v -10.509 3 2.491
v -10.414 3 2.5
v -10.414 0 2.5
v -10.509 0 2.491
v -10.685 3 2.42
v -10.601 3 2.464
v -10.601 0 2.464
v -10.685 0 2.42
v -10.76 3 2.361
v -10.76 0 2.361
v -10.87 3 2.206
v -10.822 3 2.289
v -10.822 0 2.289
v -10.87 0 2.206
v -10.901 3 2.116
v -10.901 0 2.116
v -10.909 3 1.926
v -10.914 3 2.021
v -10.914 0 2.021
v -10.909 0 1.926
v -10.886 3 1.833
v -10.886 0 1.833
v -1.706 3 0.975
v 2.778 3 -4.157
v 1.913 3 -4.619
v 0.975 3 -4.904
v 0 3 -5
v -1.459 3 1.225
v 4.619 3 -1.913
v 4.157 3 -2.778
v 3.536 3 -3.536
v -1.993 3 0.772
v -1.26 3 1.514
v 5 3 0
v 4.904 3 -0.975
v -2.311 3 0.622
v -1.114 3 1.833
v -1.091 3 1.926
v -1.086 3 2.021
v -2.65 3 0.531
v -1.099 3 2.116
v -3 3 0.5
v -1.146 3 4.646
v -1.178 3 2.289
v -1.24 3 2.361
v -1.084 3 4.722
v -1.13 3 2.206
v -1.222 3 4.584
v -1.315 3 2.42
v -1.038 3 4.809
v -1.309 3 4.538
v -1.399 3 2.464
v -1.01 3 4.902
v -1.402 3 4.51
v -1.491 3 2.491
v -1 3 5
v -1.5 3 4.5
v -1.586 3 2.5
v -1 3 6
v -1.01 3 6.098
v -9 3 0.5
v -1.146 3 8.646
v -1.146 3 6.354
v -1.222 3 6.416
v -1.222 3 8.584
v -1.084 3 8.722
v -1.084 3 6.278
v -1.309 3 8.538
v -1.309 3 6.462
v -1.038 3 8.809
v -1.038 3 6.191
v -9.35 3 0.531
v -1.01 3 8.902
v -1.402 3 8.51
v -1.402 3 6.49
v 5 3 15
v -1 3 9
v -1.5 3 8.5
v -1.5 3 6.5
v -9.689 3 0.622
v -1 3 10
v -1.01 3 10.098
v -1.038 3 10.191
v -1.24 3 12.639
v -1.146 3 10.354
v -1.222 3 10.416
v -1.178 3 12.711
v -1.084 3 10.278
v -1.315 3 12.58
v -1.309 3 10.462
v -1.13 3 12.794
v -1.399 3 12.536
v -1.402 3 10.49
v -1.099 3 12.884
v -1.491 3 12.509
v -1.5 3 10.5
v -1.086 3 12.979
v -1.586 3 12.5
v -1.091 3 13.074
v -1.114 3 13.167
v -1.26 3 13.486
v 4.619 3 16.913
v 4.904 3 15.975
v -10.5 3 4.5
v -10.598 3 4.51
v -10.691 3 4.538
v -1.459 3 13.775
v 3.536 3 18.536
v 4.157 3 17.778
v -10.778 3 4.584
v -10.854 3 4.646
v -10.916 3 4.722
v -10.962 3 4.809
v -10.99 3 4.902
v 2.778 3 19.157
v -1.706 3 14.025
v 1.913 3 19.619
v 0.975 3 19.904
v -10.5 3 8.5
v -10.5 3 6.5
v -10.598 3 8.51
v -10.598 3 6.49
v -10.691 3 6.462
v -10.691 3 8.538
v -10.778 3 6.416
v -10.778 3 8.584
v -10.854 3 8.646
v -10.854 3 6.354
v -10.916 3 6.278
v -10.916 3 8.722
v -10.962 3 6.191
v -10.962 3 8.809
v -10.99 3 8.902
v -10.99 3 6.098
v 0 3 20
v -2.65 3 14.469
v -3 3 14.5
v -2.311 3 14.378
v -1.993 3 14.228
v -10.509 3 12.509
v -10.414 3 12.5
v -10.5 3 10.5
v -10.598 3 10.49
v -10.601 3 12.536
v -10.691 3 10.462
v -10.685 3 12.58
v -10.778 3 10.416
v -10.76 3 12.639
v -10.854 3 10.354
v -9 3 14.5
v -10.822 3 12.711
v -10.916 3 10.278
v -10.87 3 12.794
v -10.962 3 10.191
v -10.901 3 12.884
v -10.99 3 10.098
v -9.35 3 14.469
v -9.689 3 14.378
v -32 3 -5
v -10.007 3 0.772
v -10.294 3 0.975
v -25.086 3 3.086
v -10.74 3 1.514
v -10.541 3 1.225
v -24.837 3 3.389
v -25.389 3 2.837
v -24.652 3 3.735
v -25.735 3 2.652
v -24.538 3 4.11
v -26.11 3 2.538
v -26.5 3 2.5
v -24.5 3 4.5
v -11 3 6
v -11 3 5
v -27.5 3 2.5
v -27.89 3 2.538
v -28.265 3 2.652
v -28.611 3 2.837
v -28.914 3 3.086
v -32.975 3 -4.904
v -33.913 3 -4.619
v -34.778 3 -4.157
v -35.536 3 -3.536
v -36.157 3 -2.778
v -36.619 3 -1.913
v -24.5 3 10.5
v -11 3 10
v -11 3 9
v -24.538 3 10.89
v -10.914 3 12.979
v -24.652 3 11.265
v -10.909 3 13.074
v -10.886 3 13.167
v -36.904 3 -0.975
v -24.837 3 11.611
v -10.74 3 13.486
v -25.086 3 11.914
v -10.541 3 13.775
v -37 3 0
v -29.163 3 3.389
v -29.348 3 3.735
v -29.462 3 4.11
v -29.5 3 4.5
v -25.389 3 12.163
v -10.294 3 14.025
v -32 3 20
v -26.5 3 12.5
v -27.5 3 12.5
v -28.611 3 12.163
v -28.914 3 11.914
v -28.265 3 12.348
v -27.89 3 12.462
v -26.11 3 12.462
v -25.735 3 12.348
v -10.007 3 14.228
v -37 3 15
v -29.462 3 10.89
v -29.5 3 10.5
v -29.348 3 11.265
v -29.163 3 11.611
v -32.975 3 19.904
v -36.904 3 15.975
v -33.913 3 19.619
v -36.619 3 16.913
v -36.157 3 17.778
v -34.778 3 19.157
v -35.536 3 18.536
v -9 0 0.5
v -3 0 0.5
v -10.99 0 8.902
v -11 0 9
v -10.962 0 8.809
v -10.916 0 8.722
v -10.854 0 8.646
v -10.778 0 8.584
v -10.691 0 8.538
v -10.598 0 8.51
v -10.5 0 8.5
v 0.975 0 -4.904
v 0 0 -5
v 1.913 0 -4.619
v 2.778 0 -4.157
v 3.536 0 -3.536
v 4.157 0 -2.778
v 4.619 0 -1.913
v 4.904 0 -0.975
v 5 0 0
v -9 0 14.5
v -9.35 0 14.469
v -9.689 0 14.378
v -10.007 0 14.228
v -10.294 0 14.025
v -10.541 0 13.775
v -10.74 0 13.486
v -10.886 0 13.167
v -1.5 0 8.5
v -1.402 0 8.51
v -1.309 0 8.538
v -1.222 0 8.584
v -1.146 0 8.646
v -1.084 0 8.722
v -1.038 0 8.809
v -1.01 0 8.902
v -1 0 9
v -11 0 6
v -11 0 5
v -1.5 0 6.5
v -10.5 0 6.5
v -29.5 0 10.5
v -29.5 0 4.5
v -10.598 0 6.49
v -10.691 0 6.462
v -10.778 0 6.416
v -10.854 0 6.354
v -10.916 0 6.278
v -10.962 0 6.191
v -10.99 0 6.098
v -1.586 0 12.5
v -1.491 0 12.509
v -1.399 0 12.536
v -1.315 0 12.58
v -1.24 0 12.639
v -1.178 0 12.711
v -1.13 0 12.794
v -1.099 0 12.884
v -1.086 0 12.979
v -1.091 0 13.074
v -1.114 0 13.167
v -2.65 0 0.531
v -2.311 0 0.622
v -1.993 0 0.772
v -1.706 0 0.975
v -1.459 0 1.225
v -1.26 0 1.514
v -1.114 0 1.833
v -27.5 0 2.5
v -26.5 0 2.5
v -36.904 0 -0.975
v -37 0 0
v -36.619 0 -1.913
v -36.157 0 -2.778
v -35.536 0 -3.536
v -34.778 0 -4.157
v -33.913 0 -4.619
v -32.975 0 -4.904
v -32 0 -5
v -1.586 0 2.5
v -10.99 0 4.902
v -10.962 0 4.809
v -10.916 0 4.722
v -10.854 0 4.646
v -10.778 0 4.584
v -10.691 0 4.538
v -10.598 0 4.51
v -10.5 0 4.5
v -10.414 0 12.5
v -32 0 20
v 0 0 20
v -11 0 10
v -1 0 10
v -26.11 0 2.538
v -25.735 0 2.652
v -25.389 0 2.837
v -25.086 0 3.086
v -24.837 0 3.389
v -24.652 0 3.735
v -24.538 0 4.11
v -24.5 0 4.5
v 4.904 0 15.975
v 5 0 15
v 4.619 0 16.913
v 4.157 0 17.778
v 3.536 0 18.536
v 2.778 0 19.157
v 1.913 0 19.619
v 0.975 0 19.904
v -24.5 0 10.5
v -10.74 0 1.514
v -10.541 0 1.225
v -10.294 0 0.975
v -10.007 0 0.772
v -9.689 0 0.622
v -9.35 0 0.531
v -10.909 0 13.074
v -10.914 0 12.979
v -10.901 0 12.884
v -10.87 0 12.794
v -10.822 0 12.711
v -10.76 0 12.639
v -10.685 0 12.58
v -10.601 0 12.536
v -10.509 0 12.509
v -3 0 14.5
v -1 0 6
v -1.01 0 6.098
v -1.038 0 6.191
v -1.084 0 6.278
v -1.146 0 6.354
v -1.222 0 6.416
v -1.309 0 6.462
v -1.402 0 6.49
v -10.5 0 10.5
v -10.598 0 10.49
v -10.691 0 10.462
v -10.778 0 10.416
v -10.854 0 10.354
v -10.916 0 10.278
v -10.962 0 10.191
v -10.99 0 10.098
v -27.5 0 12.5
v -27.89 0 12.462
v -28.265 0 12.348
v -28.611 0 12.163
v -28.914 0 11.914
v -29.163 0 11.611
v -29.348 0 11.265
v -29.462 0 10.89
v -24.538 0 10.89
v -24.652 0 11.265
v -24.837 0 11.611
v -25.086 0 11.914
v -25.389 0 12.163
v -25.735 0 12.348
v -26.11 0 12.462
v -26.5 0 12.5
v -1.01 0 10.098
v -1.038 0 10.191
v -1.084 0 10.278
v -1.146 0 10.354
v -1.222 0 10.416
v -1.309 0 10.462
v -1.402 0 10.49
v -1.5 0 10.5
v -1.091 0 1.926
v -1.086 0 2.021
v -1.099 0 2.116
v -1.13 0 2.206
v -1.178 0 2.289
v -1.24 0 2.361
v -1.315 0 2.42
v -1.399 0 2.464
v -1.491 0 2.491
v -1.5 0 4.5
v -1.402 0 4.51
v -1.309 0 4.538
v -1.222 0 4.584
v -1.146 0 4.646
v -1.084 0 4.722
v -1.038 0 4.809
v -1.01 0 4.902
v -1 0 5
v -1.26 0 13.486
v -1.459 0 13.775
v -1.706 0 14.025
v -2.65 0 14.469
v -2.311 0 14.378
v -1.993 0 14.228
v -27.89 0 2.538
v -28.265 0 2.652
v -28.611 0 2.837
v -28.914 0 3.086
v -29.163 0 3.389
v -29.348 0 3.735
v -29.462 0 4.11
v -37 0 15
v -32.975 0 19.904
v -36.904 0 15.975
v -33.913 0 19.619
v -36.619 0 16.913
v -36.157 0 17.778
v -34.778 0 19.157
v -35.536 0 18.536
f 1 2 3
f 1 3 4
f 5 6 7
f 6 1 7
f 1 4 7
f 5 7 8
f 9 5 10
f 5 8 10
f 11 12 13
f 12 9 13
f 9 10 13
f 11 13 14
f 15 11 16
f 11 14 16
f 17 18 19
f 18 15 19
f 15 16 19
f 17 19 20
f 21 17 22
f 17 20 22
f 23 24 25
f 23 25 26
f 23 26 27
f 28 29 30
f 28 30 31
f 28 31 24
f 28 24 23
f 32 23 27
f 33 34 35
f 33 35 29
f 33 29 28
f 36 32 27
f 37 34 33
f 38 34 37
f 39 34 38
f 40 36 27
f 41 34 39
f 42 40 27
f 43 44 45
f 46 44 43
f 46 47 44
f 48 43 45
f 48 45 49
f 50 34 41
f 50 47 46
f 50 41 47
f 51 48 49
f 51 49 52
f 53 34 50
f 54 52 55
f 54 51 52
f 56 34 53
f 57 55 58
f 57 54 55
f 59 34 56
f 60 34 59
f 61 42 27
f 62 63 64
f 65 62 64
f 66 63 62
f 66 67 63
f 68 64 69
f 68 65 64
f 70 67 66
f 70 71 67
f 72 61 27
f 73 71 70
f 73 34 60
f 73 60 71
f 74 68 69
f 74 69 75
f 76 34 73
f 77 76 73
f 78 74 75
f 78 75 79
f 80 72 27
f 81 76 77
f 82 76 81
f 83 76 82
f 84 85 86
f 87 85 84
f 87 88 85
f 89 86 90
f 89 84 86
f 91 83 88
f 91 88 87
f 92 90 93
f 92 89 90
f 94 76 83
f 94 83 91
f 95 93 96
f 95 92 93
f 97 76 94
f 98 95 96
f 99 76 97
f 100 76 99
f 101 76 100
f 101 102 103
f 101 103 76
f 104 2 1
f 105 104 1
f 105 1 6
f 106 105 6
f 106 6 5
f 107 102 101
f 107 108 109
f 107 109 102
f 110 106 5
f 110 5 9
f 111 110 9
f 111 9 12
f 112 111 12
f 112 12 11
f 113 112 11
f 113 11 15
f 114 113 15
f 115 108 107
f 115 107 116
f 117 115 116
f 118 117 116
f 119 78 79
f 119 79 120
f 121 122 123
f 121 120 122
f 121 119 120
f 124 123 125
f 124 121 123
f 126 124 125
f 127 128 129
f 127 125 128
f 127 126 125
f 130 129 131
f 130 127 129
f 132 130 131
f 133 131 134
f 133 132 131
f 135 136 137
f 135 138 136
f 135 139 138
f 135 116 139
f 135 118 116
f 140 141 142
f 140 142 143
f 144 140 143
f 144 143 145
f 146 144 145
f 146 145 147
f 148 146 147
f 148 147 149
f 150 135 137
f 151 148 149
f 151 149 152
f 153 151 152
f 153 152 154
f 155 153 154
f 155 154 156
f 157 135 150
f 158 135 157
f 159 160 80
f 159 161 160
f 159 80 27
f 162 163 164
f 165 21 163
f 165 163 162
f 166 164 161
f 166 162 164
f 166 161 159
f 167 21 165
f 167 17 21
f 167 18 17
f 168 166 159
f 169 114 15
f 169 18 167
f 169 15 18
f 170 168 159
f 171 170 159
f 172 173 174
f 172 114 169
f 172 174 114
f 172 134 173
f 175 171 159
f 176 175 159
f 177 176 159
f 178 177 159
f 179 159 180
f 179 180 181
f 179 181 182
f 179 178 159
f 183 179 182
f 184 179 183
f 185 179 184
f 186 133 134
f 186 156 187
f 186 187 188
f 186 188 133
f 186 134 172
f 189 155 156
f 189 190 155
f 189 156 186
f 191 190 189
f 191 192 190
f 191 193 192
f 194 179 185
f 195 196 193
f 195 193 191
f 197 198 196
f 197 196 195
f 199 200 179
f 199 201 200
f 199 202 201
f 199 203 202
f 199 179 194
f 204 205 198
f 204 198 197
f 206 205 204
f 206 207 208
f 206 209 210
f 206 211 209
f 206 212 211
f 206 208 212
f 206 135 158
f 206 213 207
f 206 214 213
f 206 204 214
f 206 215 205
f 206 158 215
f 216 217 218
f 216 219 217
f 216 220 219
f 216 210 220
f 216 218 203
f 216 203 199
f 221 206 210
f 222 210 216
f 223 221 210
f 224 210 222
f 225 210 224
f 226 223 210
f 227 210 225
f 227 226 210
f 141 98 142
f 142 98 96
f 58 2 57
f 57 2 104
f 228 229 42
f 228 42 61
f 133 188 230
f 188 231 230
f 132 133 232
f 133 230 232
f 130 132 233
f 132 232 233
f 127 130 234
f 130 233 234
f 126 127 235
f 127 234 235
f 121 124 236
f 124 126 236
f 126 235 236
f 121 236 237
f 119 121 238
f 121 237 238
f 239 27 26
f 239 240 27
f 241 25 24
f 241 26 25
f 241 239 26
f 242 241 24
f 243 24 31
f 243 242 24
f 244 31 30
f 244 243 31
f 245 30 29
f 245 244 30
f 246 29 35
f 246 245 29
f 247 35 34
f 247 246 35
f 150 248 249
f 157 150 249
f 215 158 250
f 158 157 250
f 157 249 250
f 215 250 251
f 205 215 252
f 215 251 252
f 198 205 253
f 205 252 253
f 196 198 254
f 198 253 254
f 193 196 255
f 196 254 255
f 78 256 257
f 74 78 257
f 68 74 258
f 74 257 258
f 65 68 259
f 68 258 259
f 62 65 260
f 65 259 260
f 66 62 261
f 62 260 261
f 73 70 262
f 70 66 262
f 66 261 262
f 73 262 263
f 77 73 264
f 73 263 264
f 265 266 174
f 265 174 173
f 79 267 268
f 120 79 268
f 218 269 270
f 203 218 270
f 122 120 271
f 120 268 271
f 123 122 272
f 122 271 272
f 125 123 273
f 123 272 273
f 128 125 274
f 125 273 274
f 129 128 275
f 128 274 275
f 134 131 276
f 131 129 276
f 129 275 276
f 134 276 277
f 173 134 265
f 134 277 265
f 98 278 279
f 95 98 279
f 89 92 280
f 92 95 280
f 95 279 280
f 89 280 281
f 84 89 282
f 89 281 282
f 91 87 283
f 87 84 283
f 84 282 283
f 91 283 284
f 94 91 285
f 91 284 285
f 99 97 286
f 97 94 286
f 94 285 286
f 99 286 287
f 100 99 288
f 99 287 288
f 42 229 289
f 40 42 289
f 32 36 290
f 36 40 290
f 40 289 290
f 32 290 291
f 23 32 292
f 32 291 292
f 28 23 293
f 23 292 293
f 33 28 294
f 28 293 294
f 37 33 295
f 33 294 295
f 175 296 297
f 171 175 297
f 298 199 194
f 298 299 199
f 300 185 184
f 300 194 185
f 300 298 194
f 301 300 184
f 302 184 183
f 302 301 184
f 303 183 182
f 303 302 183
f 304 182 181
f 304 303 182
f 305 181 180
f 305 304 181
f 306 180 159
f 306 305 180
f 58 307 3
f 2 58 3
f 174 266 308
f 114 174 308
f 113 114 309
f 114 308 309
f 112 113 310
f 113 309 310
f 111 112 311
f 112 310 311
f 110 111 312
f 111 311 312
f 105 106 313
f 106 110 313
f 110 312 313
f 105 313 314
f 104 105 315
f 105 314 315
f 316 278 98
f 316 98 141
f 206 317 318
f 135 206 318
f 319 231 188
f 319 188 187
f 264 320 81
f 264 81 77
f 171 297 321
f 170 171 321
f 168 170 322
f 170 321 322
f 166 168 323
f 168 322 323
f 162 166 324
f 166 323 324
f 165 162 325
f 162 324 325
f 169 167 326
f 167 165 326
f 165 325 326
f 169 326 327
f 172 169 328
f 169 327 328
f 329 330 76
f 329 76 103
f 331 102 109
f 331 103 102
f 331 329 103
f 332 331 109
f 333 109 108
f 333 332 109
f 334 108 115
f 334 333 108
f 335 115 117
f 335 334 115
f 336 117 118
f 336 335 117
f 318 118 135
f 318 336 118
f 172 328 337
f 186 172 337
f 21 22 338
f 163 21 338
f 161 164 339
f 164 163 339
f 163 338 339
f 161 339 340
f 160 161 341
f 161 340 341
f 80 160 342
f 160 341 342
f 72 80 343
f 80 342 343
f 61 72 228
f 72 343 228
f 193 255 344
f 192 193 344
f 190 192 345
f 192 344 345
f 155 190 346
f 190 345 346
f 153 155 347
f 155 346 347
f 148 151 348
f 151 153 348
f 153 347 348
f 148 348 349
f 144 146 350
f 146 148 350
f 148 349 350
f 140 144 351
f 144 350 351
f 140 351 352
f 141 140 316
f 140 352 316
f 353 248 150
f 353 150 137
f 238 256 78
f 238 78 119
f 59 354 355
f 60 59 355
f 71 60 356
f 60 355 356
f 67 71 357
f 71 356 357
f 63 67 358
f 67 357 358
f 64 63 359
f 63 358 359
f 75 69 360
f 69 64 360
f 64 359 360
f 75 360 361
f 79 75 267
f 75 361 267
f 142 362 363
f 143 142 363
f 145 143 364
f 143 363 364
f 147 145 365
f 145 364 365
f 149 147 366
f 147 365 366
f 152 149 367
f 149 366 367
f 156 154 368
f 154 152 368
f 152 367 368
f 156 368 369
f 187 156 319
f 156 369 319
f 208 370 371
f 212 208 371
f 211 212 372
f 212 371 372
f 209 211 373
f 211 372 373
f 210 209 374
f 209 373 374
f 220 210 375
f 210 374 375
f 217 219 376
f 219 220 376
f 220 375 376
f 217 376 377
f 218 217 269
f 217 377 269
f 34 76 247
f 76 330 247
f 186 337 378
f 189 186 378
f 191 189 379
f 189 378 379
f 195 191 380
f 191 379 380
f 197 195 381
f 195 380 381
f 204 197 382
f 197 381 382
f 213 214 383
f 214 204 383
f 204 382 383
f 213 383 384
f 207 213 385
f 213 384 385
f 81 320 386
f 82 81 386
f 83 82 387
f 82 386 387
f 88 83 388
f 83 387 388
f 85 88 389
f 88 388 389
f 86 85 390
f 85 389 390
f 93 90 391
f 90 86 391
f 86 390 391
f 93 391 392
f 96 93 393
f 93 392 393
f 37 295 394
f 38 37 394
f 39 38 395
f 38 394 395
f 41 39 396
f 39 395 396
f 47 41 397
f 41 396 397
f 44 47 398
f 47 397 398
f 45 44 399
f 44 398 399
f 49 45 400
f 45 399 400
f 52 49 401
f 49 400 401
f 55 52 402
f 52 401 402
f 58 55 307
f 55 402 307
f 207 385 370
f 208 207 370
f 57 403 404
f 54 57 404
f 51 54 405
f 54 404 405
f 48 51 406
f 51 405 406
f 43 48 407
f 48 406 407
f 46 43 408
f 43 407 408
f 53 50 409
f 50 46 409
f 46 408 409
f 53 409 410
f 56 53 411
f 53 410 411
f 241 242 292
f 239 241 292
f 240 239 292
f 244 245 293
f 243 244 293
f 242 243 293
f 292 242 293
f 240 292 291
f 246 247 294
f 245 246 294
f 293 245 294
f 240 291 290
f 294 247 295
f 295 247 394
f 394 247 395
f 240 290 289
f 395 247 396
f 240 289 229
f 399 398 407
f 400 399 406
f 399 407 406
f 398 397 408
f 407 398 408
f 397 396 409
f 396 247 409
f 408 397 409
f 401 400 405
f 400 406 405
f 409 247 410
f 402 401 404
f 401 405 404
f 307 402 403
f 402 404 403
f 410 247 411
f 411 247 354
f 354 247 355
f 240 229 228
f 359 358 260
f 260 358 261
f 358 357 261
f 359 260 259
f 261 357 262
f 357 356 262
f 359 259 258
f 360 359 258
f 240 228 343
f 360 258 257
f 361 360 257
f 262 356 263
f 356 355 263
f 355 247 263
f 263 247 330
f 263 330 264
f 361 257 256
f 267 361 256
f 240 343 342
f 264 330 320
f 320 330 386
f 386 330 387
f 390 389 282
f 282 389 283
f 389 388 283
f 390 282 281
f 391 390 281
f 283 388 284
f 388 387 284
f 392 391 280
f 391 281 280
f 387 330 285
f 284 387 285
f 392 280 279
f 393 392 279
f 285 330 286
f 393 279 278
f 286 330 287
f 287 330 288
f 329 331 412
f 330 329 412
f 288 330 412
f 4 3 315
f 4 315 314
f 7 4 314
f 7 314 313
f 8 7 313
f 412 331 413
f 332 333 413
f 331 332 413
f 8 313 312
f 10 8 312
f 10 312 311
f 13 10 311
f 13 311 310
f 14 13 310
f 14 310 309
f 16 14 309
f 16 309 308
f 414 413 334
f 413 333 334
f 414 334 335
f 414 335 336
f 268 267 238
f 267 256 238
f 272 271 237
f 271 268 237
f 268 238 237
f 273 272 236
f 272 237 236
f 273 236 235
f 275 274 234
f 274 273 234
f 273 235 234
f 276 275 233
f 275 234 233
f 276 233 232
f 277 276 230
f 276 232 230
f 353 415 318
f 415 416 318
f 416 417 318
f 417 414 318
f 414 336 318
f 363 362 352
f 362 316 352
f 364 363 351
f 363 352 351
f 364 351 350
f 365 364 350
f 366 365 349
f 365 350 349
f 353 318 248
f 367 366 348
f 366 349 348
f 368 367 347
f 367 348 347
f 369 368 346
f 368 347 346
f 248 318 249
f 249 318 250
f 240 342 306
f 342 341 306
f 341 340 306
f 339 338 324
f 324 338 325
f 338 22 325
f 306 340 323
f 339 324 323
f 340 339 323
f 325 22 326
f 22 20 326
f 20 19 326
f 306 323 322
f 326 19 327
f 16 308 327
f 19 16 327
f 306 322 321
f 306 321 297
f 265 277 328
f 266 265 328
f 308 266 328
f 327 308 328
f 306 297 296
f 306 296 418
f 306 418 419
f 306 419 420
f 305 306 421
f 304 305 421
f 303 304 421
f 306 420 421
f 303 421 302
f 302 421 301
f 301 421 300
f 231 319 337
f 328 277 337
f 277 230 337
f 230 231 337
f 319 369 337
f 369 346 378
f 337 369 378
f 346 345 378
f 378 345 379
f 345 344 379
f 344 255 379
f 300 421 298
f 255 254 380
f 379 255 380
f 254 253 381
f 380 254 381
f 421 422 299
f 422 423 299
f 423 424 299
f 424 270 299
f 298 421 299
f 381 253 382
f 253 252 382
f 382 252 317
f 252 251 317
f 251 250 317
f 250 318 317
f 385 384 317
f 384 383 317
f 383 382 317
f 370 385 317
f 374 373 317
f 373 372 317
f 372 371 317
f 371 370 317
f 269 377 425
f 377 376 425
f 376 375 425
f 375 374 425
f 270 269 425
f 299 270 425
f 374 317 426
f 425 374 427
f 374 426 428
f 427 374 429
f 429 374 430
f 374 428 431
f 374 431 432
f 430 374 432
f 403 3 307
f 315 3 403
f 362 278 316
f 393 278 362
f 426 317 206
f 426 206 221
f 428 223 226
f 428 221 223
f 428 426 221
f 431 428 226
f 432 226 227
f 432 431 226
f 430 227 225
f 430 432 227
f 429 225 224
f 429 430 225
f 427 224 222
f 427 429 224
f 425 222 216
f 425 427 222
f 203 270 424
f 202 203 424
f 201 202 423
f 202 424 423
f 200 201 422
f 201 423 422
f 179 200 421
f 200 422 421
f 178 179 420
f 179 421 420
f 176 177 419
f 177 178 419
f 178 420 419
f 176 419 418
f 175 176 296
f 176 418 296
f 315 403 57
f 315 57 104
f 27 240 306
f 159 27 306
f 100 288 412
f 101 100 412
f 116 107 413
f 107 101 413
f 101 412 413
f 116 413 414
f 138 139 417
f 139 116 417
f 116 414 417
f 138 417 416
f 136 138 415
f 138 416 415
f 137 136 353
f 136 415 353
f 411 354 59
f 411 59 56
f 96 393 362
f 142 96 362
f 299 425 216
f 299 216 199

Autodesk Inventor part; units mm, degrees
ref_plane "YZ Plane" through (0, 0, 0) normal (1, 0, 0) x (0, 1, 0)
ref_plane "XZ Plane" through (0, 0, 0) normal (0, 1, 0) x (-1, 0, 0)
ref_plane "XY Plane" through (0, 0, 0) normal (0, 0, 1) x (1, 0, 0)
sketch "Sketch1" plane through (0, 0, 0) normal (0, 1, 0) x (-1, 0, 0)
  line L0 (0, -5) -> (32, -5)
  line L1 (32, 20) -> (0, 20)
  line L2 (-5, 15) -> (-5, 0)
  arc A0 (0, 20) -> (-5, 15) centre (0, 15) ccw
  arc A1 (-5, 0) -> (0, -5) centre (0, 0) ccw
  line L3 (3, 0.5) -> (9, 0.5)
  line L4 (9, 14.5) -> (3, 14.5)
  line L5 (1.5858, 12.5) -> (10.4142, 12.5)
  line L6 (1.5, 10.5) -> (10.5, 10.5)
  line L7 (1.5, 8.5) -> (10.5, 8.5)
  line L8 (1.5, 6.5) -> (10.5, 6.5)
  line L9 (1.5, 4.5) -> (10.5, 4.5)
  line L10 (1.5858, 2.5) -> (10.4142, 2.5)
  arc A2 (3, 14.5) -> (1.1144, 13.1667) centre (3, 12.5) ccw
  arc A3 (10.8856, 13.1667) -> (9, 14.5) centre (9, 12.5) ccw
  arc A4 (1.1144, 1.8333) -> (3, 0.5) centre (3, 2.5) ccw
  arc A5 (9, 0.5) -> (10.8856, 1.8333) centre (9, 2.5) ccw
  line L11 (11, 5) -> (11, 6)
  line L12 (1, 6) -> (1, 5)
  line L13 (1, 10) -> (1, 9)
  line L14 (11, 9) -> (11, 10)
  arc A6 (1.5858, 2.5) -> (1.1144, 1.8333) centre (1.5858, 2) ccw
  arc A7 (10.8856, 1.8333) -> (10.4142, 2.5) centre (10.4142, 2) ccw
  arc A8 (10.5, 4.5) -> (11, 5) centre (10.5, 5) ccw
  arc A9 (11, 6) -> (10.5, 6.5) centre (10.5, 6) ccw
  arc A10 (1.5, 6.5) -> (1, 6) centre (1.5, 6) ccw
  arc A11 (1, 5) -> (1.5, 4.5) centre (1.5, 5) ccw
  arc A12 (1, 9) -> (1.5, 8.5) centre (1.5, 9) ccw
  arc A13 (1.5, 10.5) -> (1, 10) centre (1.5, 10) ccw
  arc A14 (11, 10) -> (10.5, 10.5) centre (10.5, 10) ccw
  arc A15 (10.5, 8.5) -> (11, 9) centre (10.5, 9) ccw
  arc A16 (1.1144, 13.1667) -> (1.5858, 12.5) centre (1.5858, 13) ccw
  arc A17 (10.4142, 12.5) -> (10.8856, 13.1667) centre (10.4142, 13) ccw
  arc A18 (37, 15) -> (32, 20) centre (32, 15) ccw
  arc A19 (32, -5) -> (37, 0) centre (32, 0) ccw
  line L15 (37, 15) -> (37, 0)
  line L16 (26.5, 12.5) -> (27.5, 12.5)
  line L17 (29.5, 10.5) -> (29.5, 4.5)
  line L18 (27.5, 2.5) -> (26.5, 2.5)
  line L19 (24.5, 4.5) -> (24.5, 10.5)
  arc A20 (26.5, 12.5) -> (24.5, 10.5) centre (26.5, 10.5) ccw
  arc A21 (29.5, 10.5) -> (27.5, 12.5) centre (27.5, 10.5) ccw
  arc A22 (27.5, 2.5) -> (29.5, 4.5) centre (27.5, 4.5) ccw
  arc A23 (24.5, 4.5) -> (26.5, 2.5) centre (26.5, 4.5) ccw
  point P0 (-5, -5)
  point P1 (-5, 20)
  point P2 (37, -5)
  point P3 (24.5, 12.5)
  point P4 (29.5, 12.5)
  dimension "d0" = 42
  dimension "d2" = 25
  dimension "d3" = 5
  dimension "d4" = 5
  dimension "d5" = 5
  dimension "d8" = 5.5
  dimension "d10" = 2
  dimension "d15" = 2
  dimension "d16" = 2
  dimension "d17" = 2
  dimension "d18" = 2
  dimension "d19" = 2
  dimension "d21" = 2
  dimension "d23" = 0.5
  dimension "d30" = 2
  dimension "d31" = 6
  dimension "d32" = 16
  dimension "d37" = 5
  dimension "d41" = 5
  dimension "d42" = 42
  dimension "d43" = 7.5
  dimension "d44" = 10
  dimension "d45" = 7.5
  dimension "d46" = 2
  dimension "d49" = 5
extrude "Extrusion2" add sketch "Sketch1" along normal blind 3
properties part number "Top Block2"
